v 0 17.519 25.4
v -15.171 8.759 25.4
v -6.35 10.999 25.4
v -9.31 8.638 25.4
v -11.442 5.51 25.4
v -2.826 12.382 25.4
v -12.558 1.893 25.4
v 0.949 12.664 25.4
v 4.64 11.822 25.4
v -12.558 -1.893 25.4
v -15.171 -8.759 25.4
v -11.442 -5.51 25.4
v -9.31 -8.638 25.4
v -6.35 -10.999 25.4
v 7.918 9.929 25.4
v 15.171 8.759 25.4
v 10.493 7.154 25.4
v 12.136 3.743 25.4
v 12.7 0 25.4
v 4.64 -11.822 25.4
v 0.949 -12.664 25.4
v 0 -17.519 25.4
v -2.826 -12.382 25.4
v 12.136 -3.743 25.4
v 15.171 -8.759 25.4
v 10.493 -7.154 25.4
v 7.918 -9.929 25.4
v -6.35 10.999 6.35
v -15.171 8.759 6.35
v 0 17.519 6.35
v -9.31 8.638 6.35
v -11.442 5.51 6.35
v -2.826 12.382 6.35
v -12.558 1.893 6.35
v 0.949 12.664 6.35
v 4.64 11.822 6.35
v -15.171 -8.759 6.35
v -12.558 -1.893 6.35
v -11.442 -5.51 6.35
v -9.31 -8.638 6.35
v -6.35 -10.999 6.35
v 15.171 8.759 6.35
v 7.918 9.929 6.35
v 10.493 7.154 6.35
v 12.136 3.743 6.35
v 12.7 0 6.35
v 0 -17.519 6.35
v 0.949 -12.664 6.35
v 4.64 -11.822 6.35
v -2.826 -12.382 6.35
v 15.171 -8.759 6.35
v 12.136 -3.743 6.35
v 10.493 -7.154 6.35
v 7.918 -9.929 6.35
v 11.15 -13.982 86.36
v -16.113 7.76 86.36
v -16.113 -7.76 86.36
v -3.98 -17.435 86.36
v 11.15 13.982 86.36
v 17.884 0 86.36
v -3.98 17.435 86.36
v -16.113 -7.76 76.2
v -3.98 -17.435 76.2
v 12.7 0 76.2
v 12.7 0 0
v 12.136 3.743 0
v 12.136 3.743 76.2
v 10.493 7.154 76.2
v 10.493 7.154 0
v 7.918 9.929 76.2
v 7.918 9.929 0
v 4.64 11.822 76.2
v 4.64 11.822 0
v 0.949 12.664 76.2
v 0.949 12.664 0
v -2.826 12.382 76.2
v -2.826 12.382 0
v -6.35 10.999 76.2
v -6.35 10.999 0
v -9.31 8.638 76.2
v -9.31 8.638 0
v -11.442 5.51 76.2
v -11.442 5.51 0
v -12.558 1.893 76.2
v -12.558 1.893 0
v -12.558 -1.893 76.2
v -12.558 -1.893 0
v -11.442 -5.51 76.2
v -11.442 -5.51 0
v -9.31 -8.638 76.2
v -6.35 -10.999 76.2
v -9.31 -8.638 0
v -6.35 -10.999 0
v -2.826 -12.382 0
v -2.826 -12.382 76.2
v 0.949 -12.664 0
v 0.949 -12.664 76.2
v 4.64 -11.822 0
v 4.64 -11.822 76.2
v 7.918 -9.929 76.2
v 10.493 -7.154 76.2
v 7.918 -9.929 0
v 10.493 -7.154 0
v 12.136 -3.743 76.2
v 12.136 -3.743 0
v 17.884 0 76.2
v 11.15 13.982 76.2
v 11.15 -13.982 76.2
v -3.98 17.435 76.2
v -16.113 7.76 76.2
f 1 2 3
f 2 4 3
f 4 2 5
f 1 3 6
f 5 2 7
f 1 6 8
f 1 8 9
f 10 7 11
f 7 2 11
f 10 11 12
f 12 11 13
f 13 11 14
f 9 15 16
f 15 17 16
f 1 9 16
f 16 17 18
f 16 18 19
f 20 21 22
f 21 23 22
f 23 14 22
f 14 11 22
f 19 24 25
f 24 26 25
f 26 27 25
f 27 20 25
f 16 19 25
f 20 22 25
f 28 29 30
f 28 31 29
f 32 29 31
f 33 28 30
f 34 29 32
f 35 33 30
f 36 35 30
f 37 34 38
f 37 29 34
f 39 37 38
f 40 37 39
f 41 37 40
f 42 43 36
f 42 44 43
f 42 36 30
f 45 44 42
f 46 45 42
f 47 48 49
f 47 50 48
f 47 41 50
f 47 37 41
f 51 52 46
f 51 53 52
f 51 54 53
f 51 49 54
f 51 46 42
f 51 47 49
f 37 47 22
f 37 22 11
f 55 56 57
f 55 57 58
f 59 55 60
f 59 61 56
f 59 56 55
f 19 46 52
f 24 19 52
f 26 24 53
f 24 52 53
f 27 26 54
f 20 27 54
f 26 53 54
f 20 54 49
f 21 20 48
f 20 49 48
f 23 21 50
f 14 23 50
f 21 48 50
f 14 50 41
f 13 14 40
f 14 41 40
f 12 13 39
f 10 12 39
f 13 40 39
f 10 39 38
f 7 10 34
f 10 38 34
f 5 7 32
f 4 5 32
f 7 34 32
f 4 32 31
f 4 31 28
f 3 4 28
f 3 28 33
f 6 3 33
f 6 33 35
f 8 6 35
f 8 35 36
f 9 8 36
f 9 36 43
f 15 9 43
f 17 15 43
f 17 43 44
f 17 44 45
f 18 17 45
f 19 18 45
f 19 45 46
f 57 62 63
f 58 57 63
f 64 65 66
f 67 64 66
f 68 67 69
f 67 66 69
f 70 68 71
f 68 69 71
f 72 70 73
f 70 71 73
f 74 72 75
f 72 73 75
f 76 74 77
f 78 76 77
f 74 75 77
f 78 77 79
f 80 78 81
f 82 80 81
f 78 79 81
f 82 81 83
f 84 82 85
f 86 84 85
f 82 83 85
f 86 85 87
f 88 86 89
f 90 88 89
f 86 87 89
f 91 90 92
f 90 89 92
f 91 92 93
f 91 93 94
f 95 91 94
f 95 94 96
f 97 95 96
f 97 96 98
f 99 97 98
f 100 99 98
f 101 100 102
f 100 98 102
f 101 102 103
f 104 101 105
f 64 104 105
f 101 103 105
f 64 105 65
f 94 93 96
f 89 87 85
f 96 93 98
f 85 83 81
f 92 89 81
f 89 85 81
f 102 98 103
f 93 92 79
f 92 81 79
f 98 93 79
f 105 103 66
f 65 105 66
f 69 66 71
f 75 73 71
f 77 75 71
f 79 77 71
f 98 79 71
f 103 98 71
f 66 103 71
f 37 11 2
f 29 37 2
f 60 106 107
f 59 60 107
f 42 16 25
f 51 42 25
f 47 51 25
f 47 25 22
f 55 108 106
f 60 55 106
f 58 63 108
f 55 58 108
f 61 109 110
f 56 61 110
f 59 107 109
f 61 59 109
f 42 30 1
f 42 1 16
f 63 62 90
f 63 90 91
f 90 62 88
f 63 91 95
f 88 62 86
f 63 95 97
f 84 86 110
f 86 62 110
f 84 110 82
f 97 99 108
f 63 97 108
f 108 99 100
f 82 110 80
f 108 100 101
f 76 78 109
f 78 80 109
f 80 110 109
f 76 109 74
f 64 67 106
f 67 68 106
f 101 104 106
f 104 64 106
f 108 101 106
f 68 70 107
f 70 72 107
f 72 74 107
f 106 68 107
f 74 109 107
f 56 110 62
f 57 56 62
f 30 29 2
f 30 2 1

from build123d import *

# Parameters (mm, degrees)
F0_R      = 12.7
F1_DEPTH  = 76.2
F2_R      = 12.7
F3_DEPTH  = 10.16
F4_R      = 12.7
F5_DEPTH  = 25.4
F5_FACE_R = 12.7
F6_DEPTH  = 6.35


with BuildPart() as f1:
    # F0 (on Top) → F1 (new body)
    with BuildSketch(Plane.XY):
        Circle(F0_R)
    extrude(amount=F1_DEPTH)

    # F2 (on face) → F3 (join)
    with BuildSketch(Plane.XY.offset(76.2)):
        Polygon((-16.112782, 7.759507), (-16.112782, -7.759507), (-3.979529, -17.435454), (11.150391, -13.982148), (17.883839, 0), (11.150391, 13.982148), (-3.979529, 17.435454), align=None)
        Circle(F2_R, mode=Mode.SUBTRACT)
        Circle(F2_R)
    extrude(amount=F3_DEPTH)


with BuildPart() as f5:
    # F4 (on face) → F5 (new body)
    with BuildSketch(Plane(origin=(0, 0, 0), x_dir=(1, 0, 0), z_dir=(0, 0, -1))):
        Polygon((-15.171483, 8.75926), (-15.171483, -8.75926), (0, -17.518519), (15.171483, -8.75926), (15.171483, 8.75926), (0, 17.518519), align=None)
        Circle(F4_R, mode=Mode.SUBTRACT)
    extrude(amount=-F5_DEPTH)

    # F5_face (on face) → F6 (cut)
    with BuildSketch(Plane(origin=(0, 0, 0), x_dir=(1, 0, 0), z_dir=(0, 0, -1))):
        Polygon((-15.171483, 8.75926), (-15.171483, -8.75926), (0, -17.518519), (15.171483, -8.75926), (15.171483, 8.75926), (0, 17.518519), align=None)
        Circle(F5_FACE_R, mode=Mode.SUBTRACT)
    extrude(amount=-F6_DEPTH, mode=Mode.SUBTRACT)


solid = Compound([f1.part, f5.part])
